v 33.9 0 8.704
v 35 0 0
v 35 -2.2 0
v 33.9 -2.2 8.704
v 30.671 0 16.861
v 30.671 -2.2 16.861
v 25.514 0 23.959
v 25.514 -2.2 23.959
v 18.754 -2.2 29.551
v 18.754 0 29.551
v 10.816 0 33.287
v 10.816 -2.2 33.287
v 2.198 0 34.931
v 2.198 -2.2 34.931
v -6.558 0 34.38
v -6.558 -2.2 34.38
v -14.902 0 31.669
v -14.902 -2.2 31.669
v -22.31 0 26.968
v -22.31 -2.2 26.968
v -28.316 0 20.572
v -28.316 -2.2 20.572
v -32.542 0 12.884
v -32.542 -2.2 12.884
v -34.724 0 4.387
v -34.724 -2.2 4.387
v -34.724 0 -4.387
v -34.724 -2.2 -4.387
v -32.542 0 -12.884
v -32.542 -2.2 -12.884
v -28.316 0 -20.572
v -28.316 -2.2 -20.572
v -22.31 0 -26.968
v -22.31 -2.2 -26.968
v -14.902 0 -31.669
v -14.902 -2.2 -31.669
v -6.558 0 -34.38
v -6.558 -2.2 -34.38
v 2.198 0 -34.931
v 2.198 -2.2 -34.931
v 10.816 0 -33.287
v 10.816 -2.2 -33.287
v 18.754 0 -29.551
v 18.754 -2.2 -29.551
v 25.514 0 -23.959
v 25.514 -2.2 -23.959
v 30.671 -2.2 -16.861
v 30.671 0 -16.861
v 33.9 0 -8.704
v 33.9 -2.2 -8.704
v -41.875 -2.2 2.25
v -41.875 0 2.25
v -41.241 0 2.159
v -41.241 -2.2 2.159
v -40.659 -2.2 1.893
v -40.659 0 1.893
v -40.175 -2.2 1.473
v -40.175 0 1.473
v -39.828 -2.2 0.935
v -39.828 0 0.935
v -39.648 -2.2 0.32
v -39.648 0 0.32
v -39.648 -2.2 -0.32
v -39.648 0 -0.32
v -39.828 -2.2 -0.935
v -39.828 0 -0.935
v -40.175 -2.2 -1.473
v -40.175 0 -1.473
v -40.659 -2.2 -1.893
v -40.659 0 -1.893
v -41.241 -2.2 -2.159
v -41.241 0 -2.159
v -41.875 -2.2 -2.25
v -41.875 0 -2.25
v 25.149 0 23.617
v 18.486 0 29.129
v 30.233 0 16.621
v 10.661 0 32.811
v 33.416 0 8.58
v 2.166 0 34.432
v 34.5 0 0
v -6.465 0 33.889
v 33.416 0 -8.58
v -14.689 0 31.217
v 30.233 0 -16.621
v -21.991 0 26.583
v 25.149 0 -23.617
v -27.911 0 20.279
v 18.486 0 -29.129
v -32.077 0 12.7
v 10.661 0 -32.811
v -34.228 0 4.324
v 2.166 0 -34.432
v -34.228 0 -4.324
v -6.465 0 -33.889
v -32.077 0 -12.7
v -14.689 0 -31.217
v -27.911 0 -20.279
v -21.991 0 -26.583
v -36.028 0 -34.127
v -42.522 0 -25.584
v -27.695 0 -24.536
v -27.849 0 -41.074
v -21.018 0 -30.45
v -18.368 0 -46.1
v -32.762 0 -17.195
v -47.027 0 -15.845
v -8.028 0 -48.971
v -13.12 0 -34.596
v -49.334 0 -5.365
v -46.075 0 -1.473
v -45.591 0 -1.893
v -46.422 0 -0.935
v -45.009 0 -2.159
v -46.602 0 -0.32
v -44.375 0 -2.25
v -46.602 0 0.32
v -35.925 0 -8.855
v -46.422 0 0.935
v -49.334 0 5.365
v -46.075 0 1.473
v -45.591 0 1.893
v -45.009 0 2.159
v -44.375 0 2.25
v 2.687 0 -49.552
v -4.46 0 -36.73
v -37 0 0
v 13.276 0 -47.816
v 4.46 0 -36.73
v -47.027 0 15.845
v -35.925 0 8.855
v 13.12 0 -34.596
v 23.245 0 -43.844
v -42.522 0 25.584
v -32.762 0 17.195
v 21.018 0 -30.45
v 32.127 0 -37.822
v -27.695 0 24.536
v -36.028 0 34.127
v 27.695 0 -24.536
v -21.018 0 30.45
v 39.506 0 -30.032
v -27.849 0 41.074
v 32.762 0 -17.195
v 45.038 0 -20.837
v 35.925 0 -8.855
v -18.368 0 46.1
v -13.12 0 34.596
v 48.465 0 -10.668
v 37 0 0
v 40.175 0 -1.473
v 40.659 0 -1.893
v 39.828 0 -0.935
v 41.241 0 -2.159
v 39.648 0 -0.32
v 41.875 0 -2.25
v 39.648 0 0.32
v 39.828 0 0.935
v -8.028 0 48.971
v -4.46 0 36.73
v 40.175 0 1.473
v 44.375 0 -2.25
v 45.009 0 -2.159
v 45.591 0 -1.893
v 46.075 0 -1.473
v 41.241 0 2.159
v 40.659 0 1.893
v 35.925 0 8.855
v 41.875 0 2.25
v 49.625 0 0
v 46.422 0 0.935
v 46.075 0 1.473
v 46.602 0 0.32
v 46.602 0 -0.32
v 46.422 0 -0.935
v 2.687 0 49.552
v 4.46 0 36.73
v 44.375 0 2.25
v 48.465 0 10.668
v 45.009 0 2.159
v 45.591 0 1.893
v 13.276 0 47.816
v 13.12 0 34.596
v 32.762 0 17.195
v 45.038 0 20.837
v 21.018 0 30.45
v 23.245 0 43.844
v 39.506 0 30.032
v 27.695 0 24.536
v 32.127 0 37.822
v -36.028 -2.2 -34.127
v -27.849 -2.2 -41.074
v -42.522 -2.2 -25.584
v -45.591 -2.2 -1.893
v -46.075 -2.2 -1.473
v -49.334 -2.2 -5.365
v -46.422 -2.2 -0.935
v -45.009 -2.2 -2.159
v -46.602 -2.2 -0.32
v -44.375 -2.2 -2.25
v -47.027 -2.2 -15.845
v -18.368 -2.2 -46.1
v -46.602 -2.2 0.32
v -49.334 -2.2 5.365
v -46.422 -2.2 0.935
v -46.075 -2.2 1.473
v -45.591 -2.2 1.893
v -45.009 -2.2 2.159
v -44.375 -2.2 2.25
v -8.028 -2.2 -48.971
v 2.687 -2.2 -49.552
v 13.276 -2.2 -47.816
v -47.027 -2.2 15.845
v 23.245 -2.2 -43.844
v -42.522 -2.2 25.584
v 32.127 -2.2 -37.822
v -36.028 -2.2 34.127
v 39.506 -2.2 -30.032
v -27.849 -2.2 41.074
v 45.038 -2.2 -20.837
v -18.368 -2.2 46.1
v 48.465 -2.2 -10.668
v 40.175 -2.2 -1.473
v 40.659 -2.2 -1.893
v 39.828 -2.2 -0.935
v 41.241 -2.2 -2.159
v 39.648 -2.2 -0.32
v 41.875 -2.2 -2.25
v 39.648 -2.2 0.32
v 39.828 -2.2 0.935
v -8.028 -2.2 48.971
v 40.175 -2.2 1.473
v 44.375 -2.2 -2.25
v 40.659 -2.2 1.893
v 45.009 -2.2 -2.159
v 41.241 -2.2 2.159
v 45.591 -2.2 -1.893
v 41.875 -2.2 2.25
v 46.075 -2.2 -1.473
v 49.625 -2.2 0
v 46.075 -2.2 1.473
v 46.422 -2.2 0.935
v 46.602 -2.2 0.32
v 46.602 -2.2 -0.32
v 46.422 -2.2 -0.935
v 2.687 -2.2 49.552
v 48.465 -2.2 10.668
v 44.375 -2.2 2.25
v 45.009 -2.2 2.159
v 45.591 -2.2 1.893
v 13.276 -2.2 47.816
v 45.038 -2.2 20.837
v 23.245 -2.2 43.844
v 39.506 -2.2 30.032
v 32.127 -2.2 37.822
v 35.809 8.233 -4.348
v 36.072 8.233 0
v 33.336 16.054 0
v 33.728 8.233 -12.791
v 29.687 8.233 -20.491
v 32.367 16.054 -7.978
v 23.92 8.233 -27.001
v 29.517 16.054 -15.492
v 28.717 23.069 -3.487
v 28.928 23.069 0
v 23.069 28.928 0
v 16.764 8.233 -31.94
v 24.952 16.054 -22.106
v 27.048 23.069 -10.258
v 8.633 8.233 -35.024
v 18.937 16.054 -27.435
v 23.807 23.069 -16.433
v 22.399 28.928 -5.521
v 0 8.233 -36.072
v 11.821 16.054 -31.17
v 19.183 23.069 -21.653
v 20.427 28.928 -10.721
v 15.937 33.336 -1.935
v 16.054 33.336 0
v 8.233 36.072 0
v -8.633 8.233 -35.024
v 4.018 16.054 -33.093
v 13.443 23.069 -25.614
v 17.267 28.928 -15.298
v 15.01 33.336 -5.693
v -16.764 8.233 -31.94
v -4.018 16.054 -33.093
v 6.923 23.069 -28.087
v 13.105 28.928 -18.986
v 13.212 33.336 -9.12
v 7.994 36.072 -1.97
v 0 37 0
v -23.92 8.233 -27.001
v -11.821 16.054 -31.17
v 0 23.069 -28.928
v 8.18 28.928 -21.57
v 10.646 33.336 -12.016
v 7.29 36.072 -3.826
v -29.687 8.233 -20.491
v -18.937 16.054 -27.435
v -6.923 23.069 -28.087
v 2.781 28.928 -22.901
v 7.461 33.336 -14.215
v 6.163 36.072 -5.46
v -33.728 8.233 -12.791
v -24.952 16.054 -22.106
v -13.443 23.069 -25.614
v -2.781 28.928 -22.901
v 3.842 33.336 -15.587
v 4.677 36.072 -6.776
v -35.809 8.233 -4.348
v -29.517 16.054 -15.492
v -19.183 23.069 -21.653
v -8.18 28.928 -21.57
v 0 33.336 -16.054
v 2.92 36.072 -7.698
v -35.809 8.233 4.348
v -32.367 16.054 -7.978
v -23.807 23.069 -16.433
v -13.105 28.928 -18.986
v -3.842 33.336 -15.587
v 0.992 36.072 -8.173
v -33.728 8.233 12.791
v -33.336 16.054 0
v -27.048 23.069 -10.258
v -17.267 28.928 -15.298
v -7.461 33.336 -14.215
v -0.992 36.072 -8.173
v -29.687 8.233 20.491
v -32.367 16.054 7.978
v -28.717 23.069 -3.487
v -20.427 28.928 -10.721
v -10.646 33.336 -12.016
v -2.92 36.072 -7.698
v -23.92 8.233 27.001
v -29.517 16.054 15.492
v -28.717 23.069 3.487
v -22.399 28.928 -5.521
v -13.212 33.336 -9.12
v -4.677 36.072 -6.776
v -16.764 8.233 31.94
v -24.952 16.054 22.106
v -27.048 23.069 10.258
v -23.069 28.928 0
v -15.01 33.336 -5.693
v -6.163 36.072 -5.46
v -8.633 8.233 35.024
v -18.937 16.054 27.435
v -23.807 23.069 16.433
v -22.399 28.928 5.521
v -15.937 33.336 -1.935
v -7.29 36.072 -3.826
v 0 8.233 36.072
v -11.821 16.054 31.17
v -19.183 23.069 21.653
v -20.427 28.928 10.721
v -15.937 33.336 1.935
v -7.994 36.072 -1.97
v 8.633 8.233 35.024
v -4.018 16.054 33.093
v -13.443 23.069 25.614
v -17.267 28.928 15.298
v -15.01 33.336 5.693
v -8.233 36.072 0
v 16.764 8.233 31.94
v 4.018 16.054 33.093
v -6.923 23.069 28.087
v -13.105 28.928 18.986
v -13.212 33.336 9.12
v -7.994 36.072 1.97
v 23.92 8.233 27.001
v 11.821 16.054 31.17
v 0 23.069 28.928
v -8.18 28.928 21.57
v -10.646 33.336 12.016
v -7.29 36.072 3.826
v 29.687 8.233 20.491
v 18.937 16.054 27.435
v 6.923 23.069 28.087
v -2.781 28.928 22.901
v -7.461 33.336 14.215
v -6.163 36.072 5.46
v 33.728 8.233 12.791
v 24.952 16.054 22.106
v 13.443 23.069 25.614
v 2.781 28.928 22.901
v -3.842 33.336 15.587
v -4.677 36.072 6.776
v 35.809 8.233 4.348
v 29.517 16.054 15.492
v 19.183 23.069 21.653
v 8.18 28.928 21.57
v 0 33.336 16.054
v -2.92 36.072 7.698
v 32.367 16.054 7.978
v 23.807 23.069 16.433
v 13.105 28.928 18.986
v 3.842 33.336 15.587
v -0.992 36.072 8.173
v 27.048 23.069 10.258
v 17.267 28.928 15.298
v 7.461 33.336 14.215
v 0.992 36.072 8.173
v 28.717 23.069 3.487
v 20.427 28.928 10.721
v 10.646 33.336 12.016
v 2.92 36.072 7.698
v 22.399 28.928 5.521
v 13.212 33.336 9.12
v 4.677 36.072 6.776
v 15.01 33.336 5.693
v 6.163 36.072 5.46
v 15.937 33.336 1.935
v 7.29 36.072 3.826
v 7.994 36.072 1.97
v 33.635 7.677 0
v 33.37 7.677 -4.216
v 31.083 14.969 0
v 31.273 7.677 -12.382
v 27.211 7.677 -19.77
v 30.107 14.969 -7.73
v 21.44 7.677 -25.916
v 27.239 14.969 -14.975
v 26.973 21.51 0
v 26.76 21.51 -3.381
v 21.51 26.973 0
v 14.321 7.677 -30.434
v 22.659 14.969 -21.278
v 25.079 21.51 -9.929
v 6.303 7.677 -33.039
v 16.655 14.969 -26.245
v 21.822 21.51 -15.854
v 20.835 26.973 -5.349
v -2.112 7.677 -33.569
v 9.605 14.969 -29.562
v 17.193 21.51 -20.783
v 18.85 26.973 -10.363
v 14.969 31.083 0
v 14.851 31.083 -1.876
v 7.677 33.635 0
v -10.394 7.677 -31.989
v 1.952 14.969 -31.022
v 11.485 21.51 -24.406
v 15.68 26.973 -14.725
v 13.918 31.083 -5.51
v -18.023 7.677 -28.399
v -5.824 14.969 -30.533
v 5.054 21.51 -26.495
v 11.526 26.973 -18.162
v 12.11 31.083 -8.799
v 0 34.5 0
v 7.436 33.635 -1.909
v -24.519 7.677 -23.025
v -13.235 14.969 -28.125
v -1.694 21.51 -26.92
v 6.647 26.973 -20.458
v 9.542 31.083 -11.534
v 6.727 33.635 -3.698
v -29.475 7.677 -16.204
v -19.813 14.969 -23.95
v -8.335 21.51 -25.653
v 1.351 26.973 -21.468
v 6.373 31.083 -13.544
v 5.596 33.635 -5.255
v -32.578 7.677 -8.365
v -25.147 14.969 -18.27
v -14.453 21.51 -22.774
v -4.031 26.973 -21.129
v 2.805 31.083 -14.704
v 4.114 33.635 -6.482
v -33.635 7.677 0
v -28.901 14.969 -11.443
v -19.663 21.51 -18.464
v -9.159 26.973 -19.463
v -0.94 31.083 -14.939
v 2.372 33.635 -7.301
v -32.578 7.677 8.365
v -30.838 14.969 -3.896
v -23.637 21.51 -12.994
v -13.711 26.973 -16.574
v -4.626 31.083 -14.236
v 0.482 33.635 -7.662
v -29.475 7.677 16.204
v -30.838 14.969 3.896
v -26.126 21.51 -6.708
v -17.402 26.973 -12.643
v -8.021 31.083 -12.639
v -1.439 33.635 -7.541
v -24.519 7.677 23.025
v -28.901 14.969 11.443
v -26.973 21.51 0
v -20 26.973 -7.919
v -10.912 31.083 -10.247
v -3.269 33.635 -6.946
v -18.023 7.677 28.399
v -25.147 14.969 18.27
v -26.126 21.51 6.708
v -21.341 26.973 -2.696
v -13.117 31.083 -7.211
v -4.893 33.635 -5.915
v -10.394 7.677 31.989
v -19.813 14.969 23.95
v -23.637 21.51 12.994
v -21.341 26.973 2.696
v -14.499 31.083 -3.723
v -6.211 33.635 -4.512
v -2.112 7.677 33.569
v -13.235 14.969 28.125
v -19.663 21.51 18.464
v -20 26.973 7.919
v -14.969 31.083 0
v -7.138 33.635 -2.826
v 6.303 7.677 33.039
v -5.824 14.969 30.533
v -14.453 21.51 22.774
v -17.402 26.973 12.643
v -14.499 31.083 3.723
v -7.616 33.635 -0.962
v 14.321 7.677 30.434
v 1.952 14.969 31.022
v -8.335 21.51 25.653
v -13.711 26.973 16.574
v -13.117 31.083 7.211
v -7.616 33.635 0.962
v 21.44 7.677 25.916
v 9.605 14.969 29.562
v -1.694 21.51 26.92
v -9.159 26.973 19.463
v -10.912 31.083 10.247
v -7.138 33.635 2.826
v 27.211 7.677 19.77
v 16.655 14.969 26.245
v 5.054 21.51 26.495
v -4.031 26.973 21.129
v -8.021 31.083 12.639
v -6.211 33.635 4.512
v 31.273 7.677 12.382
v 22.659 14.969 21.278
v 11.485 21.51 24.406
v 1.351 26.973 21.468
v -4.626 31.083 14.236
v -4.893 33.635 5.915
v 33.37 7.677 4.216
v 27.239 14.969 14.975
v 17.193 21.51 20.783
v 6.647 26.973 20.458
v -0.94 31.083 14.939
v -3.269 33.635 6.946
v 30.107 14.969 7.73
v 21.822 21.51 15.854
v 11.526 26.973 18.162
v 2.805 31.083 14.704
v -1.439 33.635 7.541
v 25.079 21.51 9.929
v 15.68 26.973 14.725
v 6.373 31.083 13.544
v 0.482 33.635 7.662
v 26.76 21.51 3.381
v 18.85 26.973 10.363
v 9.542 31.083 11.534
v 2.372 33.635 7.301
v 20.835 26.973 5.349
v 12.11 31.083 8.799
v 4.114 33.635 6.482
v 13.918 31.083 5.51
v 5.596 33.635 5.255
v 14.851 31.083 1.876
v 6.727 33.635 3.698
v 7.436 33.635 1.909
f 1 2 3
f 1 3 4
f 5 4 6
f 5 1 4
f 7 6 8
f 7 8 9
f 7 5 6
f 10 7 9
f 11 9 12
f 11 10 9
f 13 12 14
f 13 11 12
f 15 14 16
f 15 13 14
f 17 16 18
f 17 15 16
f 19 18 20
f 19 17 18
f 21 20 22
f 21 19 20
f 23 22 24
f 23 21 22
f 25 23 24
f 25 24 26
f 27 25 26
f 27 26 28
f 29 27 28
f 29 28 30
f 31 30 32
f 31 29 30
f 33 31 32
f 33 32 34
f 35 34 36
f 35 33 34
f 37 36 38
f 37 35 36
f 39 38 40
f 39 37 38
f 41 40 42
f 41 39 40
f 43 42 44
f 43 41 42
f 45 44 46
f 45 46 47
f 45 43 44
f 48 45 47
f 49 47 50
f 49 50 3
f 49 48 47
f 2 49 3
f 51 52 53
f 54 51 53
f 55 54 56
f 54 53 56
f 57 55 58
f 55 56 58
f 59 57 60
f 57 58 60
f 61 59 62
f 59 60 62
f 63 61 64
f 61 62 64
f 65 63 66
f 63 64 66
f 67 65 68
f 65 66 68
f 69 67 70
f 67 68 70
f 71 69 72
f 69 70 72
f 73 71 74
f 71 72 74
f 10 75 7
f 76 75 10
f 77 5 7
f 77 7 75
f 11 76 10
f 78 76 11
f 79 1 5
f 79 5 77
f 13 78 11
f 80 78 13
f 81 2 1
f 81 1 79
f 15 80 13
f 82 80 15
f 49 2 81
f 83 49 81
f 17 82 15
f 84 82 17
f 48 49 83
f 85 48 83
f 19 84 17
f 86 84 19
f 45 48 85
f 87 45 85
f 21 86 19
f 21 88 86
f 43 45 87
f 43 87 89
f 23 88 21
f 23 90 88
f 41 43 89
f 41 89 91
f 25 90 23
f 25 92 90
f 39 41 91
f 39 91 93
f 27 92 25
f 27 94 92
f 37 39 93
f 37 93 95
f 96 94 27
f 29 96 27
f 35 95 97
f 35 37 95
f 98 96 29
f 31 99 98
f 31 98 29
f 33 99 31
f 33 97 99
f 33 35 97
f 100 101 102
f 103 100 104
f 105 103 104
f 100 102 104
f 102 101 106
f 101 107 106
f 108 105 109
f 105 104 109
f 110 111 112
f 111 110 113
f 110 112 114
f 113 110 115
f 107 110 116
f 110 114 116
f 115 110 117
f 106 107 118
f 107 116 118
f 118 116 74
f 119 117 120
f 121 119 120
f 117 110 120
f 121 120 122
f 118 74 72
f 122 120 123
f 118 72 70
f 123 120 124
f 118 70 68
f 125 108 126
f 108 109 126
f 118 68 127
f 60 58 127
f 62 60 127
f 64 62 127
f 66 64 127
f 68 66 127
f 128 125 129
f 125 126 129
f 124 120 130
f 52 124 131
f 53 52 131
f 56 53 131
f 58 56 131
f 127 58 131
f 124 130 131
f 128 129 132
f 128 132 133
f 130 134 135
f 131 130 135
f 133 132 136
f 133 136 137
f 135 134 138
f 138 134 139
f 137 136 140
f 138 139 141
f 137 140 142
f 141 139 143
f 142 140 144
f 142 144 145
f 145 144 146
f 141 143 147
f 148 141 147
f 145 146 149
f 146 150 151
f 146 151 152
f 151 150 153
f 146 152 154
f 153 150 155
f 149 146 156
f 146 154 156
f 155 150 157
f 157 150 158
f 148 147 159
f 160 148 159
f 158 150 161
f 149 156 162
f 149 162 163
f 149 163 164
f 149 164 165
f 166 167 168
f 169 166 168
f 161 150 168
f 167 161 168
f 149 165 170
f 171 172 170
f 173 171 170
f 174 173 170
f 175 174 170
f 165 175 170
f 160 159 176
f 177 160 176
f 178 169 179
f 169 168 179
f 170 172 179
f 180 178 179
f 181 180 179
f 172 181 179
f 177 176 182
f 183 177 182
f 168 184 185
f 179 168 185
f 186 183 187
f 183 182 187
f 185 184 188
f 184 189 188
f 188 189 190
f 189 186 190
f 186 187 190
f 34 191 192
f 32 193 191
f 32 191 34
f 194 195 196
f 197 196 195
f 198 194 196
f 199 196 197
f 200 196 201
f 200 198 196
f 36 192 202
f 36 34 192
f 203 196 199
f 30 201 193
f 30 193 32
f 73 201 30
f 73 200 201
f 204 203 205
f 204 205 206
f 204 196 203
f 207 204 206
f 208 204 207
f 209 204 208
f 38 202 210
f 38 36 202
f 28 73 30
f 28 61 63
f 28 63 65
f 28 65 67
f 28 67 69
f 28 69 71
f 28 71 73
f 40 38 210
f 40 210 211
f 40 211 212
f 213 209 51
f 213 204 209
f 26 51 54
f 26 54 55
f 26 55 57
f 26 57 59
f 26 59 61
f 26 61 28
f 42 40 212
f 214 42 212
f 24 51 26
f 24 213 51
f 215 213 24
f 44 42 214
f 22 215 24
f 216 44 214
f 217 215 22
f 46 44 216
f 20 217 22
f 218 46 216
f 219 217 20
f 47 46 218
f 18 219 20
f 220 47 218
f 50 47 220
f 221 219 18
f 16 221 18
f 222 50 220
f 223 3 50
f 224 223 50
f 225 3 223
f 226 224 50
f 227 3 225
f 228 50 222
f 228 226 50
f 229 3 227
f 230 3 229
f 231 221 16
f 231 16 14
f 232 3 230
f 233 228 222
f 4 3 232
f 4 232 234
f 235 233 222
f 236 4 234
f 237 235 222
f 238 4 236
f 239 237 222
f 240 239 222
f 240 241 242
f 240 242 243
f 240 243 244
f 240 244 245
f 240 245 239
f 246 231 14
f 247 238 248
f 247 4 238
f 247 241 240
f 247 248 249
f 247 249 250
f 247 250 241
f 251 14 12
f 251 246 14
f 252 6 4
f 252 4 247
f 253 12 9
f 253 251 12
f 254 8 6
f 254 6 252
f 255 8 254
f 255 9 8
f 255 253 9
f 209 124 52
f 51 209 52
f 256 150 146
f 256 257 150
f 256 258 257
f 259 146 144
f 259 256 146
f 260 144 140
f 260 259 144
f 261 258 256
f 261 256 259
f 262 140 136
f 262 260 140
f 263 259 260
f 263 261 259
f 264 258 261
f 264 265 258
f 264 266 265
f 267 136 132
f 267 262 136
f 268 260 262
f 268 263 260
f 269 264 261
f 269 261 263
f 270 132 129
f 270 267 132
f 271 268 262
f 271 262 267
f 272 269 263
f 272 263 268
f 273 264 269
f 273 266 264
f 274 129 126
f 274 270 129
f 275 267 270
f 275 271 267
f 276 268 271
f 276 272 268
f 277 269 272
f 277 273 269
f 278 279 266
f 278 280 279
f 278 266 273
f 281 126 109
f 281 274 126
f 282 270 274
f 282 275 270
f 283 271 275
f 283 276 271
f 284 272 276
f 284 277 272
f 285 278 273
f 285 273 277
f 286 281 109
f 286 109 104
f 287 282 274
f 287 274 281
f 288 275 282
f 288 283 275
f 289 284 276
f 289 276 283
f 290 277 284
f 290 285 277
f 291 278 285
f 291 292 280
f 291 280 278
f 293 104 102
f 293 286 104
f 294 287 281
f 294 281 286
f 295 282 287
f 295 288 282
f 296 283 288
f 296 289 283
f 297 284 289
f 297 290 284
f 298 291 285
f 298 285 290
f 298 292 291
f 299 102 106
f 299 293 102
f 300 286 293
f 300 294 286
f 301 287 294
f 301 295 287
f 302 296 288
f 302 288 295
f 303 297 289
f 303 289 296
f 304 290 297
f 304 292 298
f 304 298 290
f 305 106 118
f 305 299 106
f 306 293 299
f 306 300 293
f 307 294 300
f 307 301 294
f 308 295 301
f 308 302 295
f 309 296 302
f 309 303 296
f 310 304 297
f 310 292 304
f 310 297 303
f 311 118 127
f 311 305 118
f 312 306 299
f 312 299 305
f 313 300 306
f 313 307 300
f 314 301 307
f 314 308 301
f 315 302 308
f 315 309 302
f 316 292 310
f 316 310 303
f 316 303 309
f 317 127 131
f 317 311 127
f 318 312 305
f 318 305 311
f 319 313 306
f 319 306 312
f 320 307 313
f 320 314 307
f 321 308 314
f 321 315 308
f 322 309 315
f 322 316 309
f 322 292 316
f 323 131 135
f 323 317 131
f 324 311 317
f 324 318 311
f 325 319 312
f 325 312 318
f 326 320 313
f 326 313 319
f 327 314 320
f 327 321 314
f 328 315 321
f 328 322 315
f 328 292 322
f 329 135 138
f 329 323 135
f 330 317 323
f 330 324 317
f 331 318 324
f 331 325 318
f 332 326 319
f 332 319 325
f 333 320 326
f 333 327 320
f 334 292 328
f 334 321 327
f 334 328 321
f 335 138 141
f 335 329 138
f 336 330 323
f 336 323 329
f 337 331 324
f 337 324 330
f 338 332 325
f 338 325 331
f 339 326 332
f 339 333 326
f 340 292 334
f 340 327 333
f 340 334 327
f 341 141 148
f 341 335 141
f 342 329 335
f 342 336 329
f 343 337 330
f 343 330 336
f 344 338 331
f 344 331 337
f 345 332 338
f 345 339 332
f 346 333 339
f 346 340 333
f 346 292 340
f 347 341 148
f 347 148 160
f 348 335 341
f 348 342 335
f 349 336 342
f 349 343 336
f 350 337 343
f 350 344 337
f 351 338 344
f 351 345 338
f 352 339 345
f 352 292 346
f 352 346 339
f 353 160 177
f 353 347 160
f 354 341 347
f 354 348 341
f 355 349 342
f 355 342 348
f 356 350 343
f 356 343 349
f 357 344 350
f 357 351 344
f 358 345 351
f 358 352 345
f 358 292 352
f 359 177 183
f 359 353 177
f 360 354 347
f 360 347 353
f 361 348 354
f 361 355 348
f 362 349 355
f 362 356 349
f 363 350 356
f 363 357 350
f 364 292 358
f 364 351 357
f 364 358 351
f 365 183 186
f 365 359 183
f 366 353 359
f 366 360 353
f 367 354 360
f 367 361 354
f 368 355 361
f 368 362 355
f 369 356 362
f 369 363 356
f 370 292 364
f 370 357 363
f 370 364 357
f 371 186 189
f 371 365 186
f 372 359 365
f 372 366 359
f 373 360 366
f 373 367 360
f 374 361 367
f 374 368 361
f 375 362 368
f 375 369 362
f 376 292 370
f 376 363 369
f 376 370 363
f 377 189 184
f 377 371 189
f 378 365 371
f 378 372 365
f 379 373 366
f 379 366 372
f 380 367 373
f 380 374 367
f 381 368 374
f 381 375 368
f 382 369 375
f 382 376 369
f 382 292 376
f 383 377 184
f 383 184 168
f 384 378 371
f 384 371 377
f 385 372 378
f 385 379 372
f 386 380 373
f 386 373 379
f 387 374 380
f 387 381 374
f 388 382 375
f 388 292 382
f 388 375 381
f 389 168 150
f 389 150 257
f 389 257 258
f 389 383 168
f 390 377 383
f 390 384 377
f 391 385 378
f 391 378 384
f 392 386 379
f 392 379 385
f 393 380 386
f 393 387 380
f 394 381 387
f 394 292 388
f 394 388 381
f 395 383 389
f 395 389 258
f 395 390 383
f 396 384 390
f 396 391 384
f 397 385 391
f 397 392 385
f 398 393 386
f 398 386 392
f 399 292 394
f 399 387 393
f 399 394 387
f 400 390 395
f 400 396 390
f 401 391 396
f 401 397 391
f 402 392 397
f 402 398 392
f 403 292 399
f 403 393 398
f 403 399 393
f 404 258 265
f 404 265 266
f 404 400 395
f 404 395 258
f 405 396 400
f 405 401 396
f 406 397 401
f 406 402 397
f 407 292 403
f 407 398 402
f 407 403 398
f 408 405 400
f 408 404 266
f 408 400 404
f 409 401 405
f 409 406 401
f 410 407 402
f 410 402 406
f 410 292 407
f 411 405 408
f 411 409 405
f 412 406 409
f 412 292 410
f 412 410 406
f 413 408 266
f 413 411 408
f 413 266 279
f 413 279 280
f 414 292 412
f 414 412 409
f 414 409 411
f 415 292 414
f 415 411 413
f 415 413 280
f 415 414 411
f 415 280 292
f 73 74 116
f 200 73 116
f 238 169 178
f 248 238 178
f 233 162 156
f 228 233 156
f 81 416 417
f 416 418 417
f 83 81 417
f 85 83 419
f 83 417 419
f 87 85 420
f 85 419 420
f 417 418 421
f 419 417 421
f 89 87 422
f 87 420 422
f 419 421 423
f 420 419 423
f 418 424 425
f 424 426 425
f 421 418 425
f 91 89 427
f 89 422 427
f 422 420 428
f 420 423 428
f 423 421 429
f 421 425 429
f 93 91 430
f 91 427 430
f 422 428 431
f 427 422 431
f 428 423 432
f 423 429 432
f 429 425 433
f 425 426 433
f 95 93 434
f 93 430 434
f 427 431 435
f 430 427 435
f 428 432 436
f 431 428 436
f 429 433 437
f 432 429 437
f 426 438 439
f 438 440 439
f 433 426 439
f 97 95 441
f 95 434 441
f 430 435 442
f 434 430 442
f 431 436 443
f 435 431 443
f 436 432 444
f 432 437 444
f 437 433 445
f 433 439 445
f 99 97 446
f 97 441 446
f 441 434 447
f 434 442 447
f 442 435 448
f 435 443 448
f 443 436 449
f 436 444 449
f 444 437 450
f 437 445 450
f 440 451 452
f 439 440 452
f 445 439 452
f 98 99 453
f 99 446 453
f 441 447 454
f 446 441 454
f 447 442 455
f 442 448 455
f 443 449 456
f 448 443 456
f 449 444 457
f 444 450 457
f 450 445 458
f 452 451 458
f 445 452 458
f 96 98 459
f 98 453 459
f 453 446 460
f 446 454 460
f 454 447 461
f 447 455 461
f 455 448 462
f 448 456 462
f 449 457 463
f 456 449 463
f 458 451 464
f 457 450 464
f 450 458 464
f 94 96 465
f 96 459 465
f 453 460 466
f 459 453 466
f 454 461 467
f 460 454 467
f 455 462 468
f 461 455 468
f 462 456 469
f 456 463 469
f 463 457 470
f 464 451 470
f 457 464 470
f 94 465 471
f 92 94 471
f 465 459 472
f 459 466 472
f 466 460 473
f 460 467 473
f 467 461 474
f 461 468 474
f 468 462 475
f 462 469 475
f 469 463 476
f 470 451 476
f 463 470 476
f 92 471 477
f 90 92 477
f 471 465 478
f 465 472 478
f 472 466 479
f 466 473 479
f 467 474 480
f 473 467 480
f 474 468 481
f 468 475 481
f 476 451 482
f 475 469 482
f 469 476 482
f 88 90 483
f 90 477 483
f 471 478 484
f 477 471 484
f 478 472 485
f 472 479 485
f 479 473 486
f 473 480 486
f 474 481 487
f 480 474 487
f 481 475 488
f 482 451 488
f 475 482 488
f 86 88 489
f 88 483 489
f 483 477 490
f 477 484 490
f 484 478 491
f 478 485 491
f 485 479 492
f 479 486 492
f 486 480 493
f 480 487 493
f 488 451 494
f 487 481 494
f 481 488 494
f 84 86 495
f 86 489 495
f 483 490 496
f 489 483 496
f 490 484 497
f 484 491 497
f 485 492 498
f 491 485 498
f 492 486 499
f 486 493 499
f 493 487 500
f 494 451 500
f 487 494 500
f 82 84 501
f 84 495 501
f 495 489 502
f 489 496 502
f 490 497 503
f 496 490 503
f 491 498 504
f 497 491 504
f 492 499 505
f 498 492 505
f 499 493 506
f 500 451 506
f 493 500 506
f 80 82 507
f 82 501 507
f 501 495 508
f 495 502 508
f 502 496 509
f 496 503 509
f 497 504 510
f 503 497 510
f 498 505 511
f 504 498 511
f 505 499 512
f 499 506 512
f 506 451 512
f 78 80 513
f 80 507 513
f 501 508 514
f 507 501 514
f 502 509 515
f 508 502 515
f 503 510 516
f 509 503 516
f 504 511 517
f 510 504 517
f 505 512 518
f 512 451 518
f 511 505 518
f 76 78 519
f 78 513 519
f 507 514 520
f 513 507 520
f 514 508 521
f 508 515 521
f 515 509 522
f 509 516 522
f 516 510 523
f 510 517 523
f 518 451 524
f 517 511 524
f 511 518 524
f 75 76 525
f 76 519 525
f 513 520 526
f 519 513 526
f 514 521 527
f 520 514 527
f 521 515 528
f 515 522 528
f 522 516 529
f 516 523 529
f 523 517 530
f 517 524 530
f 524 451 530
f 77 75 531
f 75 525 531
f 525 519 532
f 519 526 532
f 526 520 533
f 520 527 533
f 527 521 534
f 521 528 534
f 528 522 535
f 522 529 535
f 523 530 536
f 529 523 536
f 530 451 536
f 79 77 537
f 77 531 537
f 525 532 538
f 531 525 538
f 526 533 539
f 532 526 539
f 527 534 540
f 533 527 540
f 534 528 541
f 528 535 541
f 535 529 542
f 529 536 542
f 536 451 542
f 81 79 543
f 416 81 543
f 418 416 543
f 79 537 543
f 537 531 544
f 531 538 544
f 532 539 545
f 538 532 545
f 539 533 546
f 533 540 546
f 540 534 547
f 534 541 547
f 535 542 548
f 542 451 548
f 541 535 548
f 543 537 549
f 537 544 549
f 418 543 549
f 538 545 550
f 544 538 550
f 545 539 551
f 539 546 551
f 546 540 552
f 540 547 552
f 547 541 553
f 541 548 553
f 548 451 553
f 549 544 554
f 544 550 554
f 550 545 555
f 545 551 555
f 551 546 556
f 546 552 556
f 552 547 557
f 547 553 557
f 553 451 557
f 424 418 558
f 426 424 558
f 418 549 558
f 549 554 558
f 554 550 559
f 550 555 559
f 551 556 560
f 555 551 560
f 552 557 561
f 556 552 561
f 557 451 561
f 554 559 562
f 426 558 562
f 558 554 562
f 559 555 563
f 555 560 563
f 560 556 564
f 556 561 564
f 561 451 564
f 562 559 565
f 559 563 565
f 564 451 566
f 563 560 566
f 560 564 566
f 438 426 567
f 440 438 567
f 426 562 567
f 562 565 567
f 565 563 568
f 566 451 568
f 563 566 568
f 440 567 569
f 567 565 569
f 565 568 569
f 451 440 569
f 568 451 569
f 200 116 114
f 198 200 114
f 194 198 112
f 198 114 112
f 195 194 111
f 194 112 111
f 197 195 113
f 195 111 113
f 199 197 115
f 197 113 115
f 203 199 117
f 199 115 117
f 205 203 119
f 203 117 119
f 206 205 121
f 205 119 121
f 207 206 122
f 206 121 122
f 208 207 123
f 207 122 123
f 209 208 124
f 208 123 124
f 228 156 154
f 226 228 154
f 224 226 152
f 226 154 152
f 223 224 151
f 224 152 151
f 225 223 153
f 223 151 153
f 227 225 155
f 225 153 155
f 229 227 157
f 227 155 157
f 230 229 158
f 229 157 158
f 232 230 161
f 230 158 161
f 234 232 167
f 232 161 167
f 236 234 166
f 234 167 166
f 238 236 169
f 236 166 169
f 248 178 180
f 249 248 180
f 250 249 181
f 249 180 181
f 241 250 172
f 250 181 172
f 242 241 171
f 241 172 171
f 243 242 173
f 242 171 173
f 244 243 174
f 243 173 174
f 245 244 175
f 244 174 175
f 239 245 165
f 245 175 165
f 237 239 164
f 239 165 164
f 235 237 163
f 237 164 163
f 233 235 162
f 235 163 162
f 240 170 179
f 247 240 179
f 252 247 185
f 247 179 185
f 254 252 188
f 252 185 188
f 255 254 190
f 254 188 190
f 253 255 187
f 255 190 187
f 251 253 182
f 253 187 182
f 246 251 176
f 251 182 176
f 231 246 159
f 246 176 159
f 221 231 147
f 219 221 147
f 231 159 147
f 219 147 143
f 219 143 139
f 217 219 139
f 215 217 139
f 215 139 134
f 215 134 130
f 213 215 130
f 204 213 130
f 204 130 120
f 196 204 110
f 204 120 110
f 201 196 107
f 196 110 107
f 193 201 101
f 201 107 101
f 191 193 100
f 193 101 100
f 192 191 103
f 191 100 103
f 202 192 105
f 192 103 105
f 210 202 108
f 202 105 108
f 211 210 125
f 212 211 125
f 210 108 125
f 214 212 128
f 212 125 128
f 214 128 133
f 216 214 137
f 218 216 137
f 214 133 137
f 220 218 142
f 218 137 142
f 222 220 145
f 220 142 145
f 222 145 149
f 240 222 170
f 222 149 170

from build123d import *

# Parameters (mm, degrees)
F0_R     = 49.625
F0_R_2   = 35
F1_DEPTH = 2.2
F4_T     = 2.5


# Not quite as in the source:
# - a shell that OpenCascade refuses in one call is made with other operations: the cavity is built on its own and cut out
# - a feature names something its author has since deleted; it is built from what else it names


with BuildPart() as f1:
    # F0 (on Front) → F1 (new body)
    with BuildSketch(Plane.XZ):
        Circle(F0_R)
        with BuildLine():
            ThreePointArc((-44.375, -2.25), (-46.625, 0), (-44.375, 2.25))
            Line((-44.375, 2.25), (-41.875, 2.25))
            ThreePointArc((-41.875, 2.25), (-39.625, 0), (-41.875, -2.25))
            Line((-41.875, -2.25), (-44.375, -2.25))
        make_face(mode=Mode.SUBTRACT)
        Circle(F0_R_2, mode=Mode.SUBTRACT)
        with BuildLine():
            Line((44.375, -2.25), (41.875, -2.25))
            ThreePointArc((41.875, -2.25), (39.625, 0), (41.875, 2.25))
            Line((41.875, 2.25), (44.375, 2.25))
            ThreePointArc((44.375, 2.25), (46.625, 0), (44.375, -2.25))
        make_face(mode=Mode.SUBTRACT)
    extrude(amount=F1_DEPTH)

    # F2 (on Top) → F3 (revolve)
    with BuildSketch(Plane.XY):
        with BuildLine():
            Line((0, 0), (37, 0))
            ThreePointArc((37, 0), (26.1629509039, 26.1629509039), (0, 37))
            Line((0, 37), (0, 0))
        make_face()
    revolve(axis=Axis((0, 18.5, 0), (0, 1, 0)))

    # F4: shell of thickness 2.5, made by hand


with BuildPart() as f4_core1:
    # F4_t2: copy of F1
    add(f1.part)

    # the walls: a layer under each face that stays
    f4_faces = [f4_core1.faces().sort_by_distance(p)[0] for p in [
        (-49.625, -1.1, 0),
        (-33.0833333333, 0, -33.0833333333),
        (-33.0833333333, -2.2, -33.0833333333),
        (-46.625, -1.1, 0),
        (-43.125, -1.1, -2.25),
        (-43.125, -1.1, 2.25),
        (-39.625, -1.1, 0),
        (-26.1629509039, 26.1629509039, 0),
        (43.125, -1.1, -2.25),
        (46.625, -1.1, 0),
        (39.625, -1.1, 0),
        (43.125, -1.1, 2.25),
        (-35, -1.1, 0),
    ]]
    thicken(f4_faces, amount=-F4_T, mode=Mode.SUBTRACT)

    # F4_s3 → F4_t4 (revolve, cut)
    with BuildSketch(Plane.XY):
        Polygon((37.025, 0.025), (37, -2.5), (34.5, -2.5), (34.5, 0), align=None)
    revolve(axis=Axis((0, 0, 0), (0, 1, 0)), mode=Mode.SUBTRACT)


with BuildPart() as f1_1:
    add(f1.part)

    # what is left inside the walls is the cavity
    f4_cavity = [f4_core1.part.solids().sort_by_distance(p)[0] for p in [
        (-29.856226, 17.2375, 0),
    ]]
    add(f4_cavity, mode=Mode.SUBTRACT)


solid = f1_1.part
